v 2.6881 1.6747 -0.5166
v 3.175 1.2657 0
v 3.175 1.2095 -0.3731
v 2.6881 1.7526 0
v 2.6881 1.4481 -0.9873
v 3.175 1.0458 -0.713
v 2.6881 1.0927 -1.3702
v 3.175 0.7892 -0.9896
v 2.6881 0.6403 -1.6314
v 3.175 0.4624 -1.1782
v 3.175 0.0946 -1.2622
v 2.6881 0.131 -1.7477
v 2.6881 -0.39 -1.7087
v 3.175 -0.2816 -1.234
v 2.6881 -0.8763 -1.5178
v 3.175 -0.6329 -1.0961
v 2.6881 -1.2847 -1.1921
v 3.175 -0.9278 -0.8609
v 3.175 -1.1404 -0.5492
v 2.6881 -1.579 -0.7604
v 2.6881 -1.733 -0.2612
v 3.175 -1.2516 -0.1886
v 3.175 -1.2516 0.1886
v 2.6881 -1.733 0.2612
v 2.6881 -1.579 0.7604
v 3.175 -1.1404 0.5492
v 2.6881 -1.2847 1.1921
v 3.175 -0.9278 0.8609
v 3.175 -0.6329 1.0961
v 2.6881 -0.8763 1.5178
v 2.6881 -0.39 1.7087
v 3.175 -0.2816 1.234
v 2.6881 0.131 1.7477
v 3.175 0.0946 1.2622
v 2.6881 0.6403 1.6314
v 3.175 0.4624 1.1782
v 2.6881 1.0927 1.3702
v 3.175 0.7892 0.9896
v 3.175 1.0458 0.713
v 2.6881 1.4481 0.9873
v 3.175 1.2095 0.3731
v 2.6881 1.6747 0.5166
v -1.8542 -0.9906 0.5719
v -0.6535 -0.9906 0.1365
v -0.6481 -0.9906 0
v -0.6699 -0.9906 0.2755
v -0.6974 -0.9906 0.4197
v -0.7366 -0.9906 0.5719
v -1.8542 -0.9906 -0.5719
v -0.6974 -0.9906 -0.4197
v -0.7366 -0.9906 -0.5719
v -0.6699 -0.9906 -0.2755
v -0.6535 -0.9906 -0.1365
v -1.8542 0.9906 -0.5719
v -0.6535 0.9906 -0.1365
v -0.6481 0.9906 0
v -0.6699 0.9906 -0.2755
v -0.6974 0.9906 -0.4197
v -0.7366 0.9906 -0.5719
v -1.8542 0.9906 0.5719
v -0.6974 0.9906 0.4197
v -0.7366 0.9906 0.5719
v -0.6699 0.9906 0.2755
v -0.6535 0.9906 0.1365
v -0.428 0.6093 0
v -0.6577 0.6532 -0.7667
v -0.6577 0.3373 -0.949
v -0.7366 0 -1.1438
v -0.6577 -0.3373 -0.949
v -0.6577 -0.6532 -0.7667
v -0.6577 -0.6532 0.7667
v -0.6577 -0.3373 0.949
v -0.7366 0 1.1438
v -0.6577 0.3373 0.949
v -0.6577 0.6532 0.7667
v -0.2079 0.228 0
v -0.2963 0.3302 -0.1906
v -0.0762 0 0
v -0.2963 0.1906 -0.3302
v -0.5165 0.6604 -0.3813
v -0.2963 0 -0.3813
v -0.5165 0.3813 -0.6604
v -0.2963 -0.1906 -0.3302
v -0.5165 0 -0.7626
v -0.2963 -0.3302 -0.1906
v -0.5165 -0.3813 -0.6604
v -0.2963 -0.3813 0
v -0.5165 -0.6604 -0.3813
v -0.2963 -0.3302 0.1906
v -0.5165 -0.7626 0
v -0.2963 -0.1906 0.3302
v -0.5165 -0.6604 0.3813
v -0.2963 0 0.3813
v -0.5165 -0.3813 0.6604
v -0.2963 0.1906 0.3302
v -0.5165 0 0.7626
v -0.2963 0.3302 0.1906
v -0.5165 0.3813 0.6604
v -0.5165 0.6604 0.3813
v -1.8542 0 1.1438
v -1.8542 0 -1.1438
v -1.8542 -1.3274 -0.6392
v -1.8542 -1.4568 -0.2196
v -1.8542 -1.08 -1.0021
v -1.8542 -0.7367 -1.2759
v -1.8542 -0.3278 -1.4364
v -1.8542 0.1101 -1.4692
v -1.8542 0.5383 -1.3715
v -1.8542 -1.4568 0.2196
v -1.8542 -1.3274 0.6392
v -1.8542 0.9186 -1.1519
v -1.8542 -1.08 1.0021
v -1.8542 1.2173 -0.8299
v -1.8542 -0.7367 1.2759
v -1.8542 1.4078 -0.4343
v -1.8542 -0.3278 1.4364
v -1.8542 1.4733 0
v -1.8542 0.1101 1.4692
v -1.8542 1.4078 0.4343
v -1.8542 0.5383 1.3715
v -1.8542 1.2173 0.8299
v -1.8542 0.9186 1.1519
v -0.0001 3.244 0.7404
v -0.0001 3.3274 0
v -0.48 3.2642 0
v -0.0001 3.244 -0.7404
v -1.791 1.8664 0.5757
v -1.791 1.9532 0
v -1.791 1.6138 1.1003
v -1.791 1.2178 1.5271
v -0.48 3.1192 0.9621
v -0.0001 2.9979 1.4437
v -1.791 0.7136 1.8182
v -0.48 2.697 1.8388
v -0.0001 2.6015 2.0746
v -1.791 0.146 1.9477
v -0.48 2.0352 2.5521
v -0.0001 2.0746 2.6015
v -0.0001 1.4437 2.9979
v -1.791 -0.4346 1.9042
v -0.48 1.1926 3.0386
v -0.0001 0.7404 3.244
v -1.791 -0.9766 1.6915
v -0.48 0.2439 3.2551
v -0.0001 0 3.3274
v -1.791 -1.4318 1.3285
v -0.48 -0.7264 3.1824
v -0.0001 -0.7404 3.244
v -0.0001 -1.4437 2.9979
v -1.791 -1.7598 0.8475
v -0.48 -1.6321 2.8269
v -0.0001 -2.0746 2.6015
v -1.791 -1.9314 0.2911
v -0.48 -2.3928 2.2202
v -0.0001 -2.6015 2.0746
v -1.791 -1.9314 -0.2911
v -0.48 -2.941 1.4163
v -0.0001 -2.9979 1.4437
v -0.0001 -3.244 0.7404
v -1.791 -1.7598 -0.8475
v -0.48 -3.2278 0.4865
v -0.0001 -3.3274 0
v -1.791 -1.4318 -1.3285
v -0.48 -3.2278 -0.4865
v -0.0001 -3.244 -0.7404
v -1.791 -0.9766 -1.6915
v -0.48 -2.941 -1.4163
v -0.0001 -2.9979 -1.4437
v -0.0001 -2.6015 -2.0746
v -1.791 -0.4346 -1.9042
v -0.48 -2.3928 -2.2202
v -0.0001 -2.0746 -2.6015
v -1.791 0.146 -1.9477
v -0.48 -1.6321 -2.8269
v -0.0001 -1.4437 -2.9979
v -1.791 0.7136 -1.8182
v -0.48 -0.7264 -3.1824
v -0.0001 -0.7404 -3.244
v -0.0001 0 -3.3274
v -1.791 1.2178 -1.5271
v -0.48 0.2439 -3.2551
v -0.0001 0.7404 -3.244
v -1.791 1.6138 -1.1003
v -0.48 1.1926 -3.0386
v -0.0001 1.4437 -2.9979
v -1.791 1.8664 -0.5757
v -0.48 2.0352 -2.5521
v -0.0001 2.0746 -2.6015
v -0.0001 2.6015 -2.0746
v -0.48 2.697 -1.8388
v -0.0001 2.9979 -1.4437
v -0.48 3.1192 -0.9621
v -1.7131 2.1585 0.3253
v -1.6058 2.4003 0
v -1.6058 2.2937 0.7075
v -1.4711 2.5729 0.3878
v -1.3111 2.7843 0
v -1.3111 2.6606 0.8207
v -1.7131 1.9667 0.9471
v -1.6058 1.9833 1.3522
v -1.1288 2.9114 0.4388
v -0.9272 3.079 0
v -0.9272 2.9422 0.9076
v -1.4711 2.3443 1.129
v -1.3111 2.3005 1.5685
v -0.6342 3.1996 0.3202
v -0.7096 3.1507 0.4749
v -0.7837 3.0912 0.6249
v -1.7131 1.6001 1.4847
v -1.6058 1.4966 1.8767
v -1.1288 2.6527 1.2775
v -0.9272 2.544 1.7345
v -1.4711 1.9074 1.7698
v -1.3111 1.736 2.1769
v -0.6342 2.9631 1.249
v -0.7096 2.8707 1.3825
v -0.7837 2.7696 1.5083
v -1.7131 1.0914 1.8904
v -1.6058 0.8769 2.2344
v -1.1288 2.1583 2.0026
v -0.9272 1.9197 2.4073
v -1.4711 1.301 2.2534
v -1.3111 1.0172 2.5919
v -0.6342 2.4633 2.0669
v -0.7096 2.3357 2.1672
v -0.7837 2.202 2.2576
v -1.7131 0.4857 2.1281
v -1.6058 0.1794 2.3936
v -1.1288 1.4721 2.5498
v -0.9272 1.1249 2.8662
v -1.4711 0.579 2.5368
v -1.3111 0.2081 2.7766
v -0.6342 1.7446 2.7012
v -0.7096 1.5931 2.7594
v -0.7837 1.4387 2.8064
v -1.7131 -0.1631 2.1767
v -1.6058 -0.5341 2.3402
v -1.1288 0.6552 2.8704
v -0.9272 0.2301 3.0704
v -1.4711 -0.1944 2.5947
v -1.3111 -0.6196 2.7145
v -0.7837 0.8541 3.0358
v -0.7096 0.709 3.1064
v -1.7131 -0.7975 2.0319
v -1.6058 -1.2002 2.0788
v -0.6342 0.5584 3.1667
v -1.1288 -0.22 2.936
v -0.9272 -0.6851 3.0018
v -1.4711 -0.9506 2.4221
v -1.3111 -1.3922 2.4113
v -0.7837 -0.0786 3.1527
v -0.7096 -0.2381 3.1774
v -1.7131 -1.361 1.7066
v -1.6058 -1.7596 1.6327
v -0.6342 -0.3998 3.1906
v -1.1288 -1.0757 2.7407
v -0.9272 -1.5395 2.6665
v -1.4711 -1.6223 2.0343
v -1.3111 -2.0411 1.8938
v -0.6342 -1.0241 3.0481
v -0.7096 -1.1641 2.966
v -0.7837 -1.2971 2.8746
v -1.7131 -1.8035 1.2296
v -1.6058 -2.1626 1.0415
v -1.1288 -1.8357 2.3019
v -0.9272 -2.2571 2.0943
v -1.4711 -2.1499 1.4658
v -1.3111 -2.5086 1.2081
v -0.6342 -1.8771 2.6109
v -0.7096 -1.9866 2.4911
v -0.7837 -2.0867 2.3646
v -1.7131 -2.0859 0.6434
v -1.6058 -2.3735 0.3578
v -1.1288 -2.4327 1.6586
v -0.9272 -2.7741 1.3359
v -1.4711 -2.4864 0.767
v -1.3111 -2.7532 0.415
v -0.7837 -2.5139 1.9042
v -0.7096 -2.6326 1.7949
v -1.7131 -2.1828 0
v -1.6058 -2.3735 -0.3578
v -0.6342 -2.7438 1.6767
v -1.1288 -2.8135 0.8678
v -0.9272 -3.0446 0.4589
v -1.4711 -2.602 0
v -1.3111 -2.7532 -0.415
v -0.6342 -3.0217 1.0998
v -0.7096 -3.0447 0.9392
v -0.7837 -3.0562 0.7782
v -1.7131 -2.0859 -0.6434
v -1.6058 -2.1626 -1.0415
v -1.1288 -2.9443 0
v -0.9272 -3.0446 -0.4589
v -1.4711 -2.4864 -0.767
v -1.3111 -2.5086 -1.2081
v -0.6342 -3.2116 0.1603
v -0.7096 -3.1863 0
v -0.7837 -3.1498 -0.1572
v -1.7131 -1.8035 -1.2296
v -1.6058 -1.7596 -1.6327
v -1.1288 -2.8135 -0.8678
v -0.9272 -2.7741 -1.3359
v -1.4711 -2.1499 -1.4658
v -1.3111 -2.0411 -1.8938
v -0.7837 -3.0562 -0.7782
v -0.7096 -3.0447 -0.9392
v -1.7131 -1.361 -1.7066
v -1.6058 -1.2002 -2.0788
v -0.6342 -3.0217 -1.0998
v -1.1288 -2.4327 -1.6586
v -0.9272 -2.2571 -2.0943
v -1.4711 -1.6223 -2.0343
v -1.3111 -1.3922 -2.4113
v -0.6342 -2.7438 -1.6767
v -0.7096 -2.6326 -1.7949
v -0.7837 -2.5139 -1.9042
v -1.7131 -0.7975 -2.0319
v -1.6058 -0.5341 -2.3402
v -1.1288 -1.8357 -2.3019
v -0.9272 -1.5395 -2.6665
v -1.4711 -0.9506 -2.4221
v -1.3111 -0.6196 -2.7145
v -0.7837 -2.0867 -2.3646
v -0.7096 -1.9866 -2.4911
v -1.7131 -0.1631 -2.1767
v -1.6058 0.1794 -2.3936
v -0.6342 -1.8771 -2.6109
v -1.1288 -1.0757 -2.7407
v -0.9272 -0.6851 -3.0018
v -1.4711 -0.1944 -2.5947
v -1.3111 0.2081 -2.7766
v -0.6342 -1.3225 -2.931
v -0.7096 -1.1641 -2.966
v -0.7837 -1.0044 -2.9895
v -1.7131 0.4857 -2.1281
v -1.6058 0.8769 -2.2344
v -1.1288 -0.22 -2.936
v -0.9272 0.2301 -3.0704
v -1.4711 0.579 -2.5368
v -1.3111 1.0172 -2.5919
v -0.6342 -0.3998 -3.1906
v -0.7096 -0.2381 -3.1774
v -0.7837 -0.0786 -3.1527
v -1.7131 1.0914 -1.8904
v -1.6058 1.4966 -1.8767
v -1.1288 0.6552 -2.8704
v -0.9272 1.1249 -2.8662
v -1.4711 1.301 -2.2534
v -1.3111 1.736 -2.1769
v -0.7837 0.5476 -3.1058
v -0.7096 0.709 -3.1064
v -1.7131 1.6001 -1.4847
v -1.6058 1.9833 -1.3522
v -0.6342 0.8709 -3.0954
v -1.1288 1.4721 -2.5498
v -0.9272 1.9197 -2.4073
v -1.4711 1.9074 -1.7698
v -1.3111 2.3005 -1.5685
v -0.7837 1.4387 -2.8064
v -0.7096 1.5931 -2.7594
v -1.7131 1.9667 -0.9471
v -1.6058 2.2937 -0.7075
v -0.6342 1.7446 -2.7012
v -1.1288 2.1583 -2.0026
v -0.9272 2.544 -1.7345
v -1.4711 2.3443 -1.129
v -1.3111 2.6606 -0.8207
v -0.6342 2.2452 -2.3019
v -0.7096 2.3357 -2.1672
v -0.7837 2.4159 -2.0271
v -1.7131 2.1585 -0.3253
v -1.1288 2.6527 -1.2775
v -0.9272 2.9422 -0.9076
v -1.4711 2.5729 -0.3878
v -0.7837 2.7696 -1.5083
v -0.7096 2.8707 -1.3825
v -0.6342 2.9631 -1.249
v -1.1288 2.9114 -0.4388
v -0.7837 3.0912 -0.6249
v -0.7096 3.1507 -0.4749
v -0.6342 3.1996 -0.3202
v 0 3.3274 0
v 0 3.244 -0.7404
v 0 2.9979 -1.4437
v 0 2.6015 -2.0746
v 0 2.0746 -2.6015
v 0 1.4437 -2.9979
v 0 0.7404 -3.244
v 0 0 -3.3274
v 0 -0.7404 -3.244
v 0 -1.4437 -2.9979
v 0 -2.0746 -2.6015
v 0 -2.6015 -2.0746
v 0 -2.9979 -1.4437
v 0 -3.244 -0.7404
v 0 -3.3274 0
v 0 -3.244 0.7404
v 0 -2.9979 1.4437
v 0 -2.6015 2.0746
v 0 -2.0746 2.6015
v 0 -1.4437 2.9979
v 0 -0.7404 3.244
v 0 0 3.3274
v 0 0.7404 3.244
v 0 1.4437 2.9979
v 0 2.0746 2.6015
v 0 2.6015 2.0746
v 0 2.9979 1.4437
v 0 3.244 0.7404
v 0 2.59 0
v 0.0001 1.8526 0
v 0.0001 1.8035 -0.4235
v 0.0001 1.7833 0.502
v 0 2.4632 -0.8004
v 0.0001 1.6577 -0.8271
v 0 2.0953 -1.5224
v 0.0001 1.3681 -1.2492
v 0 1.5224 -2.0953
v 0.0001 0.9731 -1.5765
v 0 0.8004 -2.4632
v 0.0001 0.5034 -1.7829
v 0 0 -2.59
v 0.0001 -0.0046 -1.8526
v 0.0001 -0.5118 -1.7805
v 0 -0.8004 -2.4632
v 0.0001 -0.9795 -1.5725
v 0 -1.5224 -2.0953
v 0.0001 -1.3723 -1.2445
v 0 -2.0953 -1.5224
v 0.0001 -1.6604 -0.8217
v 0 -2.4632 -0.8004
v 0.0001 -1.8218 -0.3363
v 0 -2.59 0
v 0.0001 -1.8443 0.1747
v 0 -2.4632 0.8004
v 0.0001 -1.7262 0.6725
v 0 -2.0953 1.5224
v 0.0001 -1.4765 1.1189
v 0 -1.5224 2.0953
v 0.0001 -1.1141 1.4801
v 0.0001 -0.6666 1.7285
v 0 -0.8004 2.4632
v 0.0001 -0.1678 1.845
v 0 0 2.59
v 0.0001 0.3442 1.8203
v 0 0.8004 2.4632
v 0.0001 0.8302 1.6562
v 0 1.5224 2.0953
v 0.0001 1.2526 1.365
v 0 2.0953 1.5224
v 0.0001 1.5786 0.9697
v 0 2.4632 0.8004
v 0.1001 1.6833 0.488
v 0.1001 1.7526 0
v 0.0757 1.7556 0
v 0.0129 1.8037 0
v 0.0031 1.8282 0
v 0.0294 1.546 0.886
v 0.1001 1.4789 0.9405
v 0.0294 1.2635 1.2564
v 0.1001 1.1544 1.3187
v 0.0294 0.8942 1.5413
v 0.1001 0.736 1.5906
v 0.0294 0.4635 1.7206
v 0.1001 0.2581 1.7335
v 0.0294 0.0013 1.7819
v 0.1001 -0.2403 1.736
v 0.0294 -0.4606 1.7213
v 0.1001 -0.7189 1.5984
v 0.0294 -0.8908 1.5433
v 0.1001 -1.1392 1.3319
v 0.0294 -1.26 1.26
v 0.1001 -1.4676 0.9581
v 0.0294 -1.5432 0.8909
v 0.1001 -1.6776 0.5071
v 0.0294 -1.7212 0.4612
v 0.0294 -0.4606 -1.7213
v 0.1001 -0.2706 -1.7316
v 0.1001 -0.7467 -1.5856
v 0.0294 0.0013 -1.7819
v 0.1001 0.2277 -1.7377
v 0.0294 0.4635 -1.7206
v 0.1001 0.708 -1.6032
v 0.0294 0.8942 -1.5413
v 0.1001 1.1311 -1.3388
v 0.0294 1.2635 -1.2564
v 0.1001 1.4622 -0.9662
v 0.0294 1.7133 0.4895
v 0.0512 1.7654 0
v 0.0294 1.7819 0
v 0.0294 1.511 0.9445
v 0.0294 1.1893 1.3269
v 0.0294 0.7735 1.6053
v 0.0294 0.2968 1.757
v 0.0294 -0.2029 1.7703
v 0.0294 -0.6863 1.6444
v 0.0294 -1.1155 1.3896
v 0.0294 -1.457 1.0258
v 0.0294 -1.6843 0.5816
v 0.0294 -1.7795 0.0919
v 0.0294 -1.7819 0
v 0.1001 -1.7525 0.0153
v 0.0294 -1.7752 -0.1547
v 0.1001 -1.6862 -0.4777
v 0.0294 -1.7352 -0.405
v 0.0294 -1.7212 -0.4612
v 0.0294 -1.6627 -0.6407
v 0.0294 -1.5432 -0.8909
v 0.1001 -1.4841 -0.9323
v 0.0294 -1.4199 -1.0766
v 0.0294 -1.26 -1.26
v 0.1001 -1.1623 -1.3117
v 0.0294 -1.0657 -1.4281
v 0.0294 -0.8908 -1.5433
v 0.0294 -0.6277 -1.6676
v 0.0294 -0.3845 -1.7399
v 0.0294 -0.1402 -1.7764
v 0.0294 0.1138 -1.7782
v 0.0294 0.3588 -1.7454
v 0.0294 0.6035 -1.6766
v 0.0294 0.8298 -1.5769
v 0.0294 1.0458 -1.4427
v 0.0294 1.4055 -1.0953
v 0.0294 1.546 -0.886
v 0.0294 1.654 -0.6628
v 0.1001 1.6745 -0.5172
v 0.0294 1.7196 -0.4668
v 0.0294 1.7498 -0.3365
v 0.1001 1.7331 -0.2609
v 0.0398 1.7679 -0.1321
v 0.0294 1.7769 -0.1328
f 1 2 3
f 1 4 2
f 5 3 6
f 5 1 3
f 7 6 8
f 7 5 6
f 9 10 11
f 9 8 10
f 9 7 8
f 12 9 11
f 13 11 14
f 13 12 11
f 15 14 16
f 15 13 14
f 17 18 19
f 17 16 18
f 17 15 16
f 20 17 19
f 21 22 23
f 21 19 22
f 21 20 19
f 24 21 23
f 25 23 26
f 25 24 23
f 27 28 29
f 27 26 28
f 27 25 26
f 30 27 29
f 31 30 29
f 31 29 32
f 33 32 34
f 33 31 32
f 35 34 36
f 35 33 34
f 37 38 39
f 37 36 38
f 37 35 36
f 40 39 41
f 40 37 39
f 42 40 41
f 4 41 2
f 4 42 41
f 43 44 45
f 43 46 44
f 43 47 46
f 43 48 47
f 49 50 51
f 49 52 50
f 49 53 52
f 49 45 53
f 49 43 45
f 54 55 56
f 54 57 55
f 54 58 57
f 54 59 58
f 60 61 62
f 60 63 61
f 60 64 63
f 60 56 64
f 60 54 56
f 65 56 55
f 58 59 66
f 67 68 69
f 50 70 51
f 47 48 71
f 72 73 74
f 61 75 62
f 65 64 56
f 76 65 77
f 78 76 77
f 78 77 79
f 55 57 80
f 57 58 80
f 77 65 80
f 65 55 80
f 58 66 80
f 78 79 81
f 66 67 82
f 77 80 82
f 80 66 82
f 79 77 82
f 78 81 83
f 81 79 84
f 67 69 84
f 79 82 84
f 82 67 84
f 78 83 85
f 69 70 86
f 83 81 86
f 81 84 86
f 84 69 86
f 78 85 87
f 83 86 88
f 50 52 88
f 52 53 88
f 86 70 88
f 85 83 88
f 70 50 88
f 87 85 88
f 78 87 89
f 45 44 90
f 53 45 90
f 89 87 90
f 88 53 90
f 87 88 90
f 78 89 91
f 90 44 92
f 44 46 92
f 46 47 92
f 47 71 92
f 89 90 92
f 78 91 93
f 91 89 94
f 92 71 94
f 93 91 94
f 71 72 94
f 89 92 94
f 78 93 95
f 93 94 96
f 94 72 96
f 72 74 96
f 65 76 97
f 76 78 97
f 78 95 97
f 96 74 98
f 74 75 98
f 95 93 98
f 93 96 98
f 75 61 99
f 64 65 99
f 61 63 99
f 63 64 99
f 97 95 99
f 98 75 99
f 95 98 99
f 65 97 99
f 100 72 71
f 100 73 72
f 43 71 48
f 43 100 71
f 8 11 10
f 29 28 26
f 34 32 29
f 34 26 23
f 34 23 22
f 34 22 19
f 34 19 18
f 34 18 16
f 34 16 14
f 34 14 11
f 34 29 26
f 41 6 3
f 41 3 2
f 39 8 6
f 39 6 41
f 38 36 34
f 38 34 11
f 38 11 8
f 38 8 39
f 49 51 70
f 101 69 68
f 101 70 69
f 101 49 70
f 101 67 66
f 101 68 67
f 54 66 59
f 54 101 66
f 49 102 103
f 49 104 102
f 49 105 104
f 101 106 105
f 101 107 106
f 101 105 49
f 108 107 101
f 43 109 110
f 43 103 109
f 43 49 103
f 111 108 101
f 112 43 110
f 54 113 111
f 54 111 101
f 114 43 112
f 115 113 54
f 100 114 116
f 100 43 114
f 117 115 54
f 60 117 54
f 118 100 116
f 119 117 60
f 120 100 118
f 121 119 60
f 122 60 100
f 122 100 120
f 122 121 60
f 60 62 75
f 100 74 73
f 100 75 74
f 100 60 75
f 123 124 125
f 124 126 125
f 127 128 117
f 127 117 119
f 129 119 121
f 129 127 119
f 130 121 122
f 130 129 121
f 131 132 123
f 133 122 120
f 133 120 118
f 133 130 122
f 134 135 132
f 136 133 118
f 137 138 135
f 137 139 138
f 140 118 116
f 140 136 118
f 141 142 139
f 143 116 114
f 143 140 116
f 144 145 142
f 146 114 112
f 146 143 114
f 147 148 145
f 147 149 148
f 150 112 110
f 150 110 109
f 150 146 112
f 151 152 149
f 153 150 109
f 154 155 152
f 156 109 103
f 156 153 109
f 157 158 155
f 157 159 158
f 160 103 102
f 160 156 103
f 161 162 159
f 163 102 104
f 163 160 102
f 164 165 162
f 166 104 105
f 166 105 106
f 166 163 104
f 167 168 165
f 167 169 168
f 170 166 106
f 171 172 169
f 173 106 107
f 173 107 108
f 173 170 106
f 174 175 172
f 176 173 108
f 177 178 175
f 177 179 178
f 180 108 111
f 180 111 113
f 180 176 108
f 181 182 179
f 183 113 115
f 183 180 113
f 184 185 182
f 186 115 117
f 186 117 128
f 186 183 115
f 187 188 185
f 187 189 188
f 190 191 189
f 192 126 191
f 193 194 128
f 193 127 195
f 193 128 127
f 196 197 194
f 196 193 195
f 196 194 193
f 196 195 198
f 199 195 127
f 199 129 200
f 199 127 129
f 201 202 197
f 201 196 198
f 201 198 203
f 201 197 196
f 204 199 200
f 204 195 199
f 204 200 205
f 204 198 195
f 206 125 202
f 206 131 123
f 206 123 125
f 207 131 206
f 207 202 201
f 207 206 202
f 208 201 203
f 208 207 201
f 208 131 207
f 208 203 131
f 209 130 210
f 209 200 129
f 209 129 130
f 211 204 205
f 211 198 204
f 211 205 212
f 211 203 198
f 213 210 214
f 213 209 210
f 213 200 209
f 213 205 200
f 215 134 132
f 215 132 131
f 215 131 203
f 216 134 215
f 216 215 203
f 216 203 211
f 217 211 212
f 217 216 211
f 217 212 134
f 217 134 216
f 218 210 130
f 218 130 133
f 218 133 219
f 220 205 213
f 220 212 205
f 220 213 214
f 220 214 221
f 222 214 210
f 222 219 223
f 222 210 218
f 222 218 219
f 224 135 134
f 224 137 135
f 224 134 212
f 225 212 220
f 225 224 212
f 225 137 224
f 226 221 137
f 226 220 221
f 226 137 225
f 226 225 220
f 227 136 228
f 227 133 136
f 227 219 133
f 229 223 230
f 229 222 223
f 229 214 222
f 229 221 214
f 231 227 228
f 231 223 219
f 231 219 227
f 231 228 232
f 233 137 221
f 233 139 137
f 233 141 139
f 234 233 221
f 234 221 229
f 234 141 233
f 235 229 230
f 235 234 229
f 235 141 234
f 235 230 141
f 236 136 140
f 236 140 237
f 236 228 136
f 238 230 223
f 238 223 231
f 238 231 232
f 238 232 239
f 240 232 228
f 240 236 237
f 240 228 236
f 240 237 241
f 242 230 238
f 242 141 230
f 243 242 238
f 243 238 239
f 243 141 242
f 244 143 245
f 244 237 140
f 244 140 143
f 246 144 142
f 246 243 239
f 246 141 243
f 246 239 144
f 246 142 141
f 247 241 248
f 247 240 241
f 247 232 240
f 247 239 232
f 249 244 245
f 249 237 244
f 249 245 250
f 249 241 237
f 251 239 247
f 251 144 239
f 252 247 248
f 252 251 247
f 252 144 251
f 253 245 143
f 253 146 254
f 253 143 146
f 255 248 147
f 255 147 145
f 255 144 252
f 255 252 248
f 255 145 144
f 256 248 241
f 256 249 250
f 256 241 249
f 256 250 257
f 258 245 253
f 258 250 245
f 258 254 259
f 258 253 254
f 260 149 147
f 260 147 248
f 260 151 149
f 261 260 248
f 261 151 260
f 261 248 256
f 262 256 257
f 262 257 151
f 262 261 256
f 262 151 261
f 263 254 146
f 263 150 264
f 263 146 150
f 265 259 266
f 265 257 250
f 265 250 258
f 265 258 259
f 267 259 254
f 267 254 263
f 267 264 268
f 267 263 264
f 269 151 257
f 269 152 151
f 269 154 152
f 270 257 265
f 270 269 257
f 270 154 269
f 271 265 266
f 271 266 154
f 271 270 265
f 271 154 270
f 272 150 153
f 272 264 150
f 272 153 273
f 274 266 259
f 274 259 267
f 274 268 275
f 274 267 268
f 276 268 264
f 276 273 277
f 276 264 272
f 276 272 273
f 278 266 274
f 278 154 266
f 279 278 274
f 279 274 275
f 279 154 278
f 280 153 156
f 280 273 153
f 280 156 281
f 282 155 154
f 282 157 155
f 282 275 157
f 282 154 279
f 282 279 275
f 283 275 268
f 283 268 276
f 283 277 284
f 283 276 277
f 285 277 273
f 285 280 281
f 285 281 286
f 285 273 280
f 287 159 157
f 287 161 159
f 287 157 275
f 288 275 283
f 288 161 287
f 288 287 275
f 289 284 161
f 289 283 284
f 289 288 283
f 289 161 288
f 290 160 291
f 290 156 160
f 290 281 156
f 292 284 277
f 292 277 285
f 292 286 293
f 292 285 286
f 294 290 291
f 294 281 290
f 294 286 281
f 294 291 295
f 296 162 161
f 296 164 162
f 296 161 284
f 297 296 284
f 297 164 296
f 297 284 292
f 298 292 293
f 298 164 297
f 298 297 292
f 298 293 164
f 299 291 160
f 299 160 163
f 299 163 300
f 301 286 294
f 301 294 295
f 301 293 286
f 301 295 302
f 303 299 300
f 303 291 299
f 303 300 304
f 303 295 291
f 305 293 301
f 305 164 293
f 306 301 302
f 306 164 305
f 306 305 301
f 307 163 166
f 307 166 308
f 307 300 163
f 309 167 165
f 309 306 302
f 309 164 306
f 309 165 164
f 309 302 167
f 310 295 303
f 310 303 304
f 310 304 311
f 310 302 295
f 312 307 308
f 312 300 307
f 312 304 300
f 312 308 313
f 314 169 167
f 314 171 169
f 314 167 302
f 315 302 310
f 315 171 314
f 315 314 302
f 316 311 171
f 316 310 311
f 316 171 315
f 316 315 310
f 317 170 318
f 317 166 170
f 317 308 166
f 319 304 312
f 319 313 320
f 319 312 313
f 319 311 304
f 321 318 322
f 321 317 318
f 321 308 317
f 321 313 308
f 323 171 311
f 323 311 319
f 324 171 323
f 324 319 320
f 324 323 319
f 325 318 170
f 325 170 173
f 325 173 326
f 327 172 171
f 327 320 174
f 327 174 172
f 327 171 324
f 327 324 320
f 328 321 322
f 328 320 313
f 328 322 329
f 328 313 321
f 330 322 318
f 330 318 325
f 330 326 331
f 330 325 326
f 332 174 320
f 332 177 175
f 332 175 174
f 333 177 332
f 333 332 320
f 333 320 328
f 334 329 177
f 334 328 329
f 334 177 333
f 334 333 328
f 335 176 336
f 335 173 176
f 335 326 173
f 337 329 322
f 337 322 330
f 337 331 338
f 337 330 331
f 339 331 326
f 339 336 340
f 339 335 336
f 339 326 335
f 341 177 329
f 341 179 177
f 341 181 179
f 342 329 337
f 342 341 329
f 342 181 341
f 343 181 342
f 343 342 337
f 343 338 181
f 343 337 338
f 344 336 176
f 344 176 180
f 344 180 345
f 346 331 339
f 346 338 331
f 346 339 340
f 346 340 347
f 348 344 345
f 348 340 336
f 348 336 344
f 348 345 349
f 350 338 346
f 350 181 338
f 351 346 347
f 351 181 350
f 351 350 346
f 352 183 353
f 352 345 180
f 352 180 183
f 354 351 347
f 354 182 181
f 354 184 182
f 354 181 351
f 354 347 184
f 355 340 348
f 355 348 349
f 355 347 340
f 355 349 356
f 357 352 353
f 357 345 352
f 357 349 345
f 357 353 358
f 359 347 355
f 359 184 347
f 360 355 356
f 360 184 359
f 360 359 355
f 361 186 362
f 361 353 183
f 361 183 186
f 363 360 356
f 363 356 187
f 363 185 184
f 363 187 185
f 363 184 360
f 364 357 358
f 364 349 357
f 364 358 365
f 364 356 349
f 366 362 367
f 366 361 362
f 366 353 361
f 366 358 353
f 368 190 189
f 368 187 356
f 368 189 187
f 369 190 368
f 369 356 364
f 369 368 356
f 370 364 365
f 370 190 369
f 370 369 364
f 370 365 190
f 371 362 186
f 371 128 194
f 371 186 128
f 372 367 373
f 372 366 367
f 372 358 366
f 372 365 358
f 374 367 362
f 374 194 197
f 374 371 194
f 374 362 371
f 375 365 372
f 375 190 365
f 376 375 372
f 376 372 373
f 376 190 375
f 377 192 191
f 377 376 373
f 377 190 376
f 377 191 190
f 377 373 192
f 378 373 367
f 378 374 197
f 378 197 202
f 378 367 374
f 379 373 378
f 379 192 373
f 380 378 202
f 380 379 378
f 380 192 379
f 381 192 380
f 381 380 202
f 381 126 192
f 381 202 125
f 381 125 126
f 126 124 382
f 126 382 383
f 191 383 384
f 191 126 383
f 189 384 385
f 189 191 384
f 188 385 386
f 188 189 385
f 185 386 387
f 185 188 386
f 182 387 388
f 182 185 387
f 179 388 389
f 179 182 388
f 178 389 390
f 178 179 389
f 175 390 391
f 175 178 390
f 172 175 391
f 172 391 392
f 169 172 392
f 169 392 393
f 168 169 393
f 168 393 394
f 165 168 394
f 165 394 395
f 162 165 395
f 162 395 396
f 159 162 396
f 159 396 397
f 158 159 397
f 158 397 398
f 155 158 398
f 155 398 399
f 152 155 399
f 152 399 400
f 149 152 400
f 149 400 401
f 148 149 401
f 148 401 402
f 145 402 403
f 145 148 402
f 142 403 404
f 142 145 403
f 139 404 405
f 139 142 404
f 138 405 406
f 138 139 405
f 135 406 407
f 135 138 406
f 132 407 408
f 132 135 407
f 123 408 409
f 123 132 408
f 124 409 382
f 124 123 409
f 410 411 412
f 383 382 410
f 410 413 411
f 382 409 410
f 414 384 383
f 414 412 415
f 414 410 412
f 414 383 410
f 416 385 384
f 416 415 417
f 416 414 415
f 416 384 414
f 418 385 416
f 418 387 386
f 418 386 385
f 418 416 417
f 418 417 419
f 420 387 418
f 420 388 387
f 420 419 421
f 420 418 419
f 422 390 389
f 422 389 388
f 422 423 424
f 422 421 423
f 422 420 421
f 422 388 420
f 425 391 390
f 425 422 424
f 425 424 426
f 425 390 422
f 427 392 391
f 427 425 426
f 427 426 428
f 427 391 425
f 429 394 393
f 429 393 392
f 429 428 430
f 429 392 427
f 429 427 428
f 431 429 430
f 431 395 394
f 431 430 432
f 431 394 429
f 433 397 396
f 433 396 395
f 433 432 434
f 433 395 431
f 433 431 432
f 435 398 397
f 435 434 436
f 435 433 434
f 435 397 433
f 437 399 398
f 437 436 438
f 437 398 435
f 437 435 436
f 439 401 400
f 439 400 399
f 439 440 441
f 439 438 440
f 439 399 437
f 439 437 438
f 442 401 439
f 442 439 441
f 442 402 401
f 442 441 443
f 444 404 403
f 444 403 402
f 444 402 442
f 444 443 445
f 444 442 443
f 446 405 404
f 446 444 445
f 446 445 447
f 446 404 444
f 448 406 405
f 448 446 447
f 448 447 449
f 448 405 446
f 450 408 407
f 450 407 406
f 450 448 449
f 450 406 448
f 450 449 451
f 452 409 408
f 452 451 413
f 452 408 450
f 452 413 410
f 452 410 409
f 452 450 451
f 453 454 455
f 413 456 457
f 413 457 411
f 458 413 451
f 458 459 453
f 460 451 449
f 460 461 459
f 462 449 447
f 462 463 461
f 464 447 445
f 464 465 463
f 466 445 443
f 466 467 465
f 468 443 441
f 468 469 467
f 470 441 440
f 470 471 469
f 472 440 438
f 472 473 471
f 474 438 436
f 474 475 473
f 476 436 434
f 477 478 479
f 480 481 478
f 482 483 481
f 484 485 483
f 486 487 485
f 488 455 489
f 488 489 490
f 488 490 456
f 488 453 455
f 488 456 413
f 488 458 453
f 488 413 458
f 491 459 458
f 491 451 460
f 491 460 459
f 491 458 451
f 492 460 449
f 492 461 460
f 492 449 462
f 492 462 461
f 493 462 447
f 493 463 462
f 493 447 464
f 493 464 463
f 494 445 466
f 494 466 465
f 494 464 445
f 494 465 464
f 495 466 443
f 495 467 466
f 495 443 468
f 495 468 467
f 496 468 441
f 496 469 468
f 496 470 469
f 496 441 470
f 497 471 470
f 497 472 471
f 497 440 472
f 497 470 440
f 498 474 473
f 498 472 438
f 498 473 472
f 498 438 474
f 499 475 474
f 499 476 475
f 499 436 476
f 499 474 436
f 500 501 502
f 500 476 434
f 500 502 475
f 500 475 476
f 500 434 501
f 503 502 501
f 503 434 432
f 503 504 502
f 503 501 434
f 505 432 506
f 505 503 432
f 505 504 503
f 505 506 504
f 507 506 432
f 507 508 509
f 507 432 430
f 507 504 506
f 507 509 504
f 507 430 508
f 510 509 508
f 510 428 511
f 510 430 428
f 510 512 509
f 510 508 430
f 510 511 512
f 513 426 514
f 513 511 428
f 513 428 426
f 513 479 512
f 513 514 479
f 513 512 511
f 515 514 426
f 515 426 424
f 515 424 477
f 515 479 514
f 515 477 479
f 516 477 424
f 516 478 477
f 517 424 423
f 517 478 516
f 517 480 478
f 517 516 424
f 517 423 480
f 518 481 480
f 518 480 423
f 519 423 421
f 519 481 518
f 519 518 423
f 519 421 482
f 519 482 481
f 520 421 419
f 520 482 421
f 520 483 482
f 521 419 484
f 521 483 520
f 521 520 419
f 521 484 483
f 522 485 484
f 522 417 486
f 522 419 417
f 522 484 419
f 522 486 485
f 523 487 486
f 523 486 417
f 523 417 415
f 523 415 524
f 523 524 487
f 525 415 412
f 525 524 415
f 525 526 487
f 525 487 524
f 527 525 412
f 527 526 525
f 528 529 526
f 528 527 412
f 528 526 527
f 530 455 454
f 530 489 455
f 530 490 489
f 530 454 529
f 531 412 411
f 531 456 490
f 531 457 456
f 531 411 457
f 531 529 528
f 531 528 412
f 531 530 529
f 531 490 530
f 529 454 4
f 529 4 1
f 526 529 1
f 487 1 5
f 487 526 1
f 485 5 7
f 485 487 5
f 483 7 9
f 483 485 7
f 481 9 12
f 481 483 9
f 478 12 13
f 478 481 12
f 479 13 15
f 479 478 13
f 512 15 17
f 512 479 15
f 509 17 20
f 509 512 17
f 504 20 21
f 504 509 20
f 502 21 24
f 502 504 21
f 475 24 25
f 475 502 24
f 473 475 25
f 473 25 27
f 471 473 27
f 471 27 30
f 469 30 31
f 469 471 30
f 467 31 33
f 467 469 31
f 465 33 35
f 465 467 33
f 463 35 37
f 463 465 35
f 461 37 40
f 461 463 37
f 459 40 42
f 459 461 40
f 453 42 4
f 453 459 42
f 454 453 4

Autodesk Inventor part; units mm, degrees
ref_plane "YZ Plane" through (0, 0, 0) normal (1, 0, 0) x (0, 1, 0)
ref_plane "XZ Plane" through (0, 0, 0) normal (0, 1, 0) x (-1, 0, 0)
sketch "Sketch1" plane through (0, 0, 0) normal (0, 0, 1) x (1, 0, 0)
  line L0 (-0.0762, 0) -> (3.175, 0)
  line L1 (3.175, 0) -> (3.175, 1.7526)
  line L2 (3.175, 1.7526) -> (1.5902, 1.7526)
  line L3 (1.5902, 1.7526) -> (0.0001, 1.7526)
  line L4 (0.0001, 1.7526) -> (0, 1.7526)
  line L5 (0, 1.7526) -> (0, 3.3274)
  line L6 (0, 3.3274) -> (-1.8542, 3.3274)
  line L7 (-1.8542, 3.3274) -> (-1.8542, 1.1438)
  line L8 (-1.8542, 1.1438) -> (-0.7366, 1.1438)
  line L9 (-0.7366, 1.1438) -> (-0.0762, 0)
  line L10 (-2.86, 0) -> (4.1808, 0) projected
  line L11 (0, -0.6655) -> (0, 3.9929) projected
  line L12 (1.5902, 1.7526) -> (0, 1.7526) construction
  dimension "d1" = 1.5848
  dimension "d2" = 1.5901
  dimension "d3" = 1.8542
  dimension "d4" = 1.1176
  dimension "d5" = 60
  dimension "d6" = 3.5052
  dimension "d7" = 3.5052
  dimension "d8" = 2.2877
  dimension "d9" = 6.6548
  dimension "d26" = 3.175
revolve "Body" add sketch "Sketch1" angle 360 about axis through (-0.0762, 0, 0) along (1, 0, 0)
sketch "Sketch2" plane through (-1.8542, 0, 0) normal (-1, 0, 0) x (0, 0, 1)
  circle A0 centre (0, 0) radius 1.1438 projected
  line L0 (0, -4.6584) -> (0, 4.6584) projected
  line L1 (-4.6584, 0) -> (4.6584, 0) projected
  line L2 (1.1438, 0) -> (0.5719, -0.9906)
  line L3 (0.5719, -0.9906) -> (-0.5719, -0.9906)
  line L4 (-0.5719, -0.9906) -> (-1.1438, 0)
  line L5 (-1.1438, 0) -> (-0.5719, 0.9906)
  line L6 (-0.5719, 0.9906) -> (0.5719, 0.9906)
  line L7 (0.5719, 0.9906) -> (1.1438, 0)
extrude "Slot" add sketch "Sketch2" against normal up to next contours L7 A0 | A0 L2 | L6 L0 A0 | A0 L0 L3 | L0 L6 A0 | A0 L3 L0 | L4 A0 | A0 L5
fillet "Fillet1" radius 1.8541 1 edges at (-1.8542, -3.3274, 0)
thread "Thread" size "6-32 UNC" class "2A" standard "ANSI Unified Screw Threads" length 1.5848
chamfer "Chamfer1" distance 0.4869 distance2 0.4869 1 edges at (3.175, -1.7526, 0) measured on face at (3.175, -0.5672, -0.1398)
ref_plane "Work Plane1" through (29, 0, 0) normal (0, -1, 0) x (1, 0, 0)
fillet "Fillet2" radius 0.1 1 edges at (0.0001, -1.7526, 0)
equation "\"d30\" = R"
equation "\"d17\" = RR"
equation "\"d13\" = GEL"
equation "\"d15\" = -0.5 * SPD + 0.5 * GD"
equation "\"d16\" = GUL"
equation "\"d1\" = GEL"
equation "\"d3\" = KOH"
equation "\"d4\" = INTI"
equation "\"d6\" = GD"
equation "\"d7\" = BDM"
equation "\"d8\" = 1.1547 * SW"
equation "\"d9\" = KOD"
equation "\"d26\" = NLG"
equation "\"GD\" = NND"
equation "\"NLG\" = 3.175"
equation "\"GEL\" = 1.58476"
equation "\"KOD\" = 6.6548"
equation "\"KOH\" = 1.8542"
equation "\"INTI\" = 1.1176"
equation "\"GAL\" = 1.59004"
equation "\"GUL\" = 0.48692"
equation "\"BDM\" = NND"
equation "\"SW\" = 1.9812"
equation "\"RR\" = 1.8541"
equation "\"SPD\" = 2.53136"
equation "\"R\" = 0.1"
equation "\"TOA\" = 30deg"
equation "\"GD1\" = SPD"
equation "\"THREADDIA\" = 3.5052"
equation "\"KOH1\" = 0.381"
equation "\"NND\" = 3.5052"
equation "\"E0\" = 2.28829"
properties part number "ANSI B18.3 - 6 - 32 x 1/8" material "Steel, Mild"
